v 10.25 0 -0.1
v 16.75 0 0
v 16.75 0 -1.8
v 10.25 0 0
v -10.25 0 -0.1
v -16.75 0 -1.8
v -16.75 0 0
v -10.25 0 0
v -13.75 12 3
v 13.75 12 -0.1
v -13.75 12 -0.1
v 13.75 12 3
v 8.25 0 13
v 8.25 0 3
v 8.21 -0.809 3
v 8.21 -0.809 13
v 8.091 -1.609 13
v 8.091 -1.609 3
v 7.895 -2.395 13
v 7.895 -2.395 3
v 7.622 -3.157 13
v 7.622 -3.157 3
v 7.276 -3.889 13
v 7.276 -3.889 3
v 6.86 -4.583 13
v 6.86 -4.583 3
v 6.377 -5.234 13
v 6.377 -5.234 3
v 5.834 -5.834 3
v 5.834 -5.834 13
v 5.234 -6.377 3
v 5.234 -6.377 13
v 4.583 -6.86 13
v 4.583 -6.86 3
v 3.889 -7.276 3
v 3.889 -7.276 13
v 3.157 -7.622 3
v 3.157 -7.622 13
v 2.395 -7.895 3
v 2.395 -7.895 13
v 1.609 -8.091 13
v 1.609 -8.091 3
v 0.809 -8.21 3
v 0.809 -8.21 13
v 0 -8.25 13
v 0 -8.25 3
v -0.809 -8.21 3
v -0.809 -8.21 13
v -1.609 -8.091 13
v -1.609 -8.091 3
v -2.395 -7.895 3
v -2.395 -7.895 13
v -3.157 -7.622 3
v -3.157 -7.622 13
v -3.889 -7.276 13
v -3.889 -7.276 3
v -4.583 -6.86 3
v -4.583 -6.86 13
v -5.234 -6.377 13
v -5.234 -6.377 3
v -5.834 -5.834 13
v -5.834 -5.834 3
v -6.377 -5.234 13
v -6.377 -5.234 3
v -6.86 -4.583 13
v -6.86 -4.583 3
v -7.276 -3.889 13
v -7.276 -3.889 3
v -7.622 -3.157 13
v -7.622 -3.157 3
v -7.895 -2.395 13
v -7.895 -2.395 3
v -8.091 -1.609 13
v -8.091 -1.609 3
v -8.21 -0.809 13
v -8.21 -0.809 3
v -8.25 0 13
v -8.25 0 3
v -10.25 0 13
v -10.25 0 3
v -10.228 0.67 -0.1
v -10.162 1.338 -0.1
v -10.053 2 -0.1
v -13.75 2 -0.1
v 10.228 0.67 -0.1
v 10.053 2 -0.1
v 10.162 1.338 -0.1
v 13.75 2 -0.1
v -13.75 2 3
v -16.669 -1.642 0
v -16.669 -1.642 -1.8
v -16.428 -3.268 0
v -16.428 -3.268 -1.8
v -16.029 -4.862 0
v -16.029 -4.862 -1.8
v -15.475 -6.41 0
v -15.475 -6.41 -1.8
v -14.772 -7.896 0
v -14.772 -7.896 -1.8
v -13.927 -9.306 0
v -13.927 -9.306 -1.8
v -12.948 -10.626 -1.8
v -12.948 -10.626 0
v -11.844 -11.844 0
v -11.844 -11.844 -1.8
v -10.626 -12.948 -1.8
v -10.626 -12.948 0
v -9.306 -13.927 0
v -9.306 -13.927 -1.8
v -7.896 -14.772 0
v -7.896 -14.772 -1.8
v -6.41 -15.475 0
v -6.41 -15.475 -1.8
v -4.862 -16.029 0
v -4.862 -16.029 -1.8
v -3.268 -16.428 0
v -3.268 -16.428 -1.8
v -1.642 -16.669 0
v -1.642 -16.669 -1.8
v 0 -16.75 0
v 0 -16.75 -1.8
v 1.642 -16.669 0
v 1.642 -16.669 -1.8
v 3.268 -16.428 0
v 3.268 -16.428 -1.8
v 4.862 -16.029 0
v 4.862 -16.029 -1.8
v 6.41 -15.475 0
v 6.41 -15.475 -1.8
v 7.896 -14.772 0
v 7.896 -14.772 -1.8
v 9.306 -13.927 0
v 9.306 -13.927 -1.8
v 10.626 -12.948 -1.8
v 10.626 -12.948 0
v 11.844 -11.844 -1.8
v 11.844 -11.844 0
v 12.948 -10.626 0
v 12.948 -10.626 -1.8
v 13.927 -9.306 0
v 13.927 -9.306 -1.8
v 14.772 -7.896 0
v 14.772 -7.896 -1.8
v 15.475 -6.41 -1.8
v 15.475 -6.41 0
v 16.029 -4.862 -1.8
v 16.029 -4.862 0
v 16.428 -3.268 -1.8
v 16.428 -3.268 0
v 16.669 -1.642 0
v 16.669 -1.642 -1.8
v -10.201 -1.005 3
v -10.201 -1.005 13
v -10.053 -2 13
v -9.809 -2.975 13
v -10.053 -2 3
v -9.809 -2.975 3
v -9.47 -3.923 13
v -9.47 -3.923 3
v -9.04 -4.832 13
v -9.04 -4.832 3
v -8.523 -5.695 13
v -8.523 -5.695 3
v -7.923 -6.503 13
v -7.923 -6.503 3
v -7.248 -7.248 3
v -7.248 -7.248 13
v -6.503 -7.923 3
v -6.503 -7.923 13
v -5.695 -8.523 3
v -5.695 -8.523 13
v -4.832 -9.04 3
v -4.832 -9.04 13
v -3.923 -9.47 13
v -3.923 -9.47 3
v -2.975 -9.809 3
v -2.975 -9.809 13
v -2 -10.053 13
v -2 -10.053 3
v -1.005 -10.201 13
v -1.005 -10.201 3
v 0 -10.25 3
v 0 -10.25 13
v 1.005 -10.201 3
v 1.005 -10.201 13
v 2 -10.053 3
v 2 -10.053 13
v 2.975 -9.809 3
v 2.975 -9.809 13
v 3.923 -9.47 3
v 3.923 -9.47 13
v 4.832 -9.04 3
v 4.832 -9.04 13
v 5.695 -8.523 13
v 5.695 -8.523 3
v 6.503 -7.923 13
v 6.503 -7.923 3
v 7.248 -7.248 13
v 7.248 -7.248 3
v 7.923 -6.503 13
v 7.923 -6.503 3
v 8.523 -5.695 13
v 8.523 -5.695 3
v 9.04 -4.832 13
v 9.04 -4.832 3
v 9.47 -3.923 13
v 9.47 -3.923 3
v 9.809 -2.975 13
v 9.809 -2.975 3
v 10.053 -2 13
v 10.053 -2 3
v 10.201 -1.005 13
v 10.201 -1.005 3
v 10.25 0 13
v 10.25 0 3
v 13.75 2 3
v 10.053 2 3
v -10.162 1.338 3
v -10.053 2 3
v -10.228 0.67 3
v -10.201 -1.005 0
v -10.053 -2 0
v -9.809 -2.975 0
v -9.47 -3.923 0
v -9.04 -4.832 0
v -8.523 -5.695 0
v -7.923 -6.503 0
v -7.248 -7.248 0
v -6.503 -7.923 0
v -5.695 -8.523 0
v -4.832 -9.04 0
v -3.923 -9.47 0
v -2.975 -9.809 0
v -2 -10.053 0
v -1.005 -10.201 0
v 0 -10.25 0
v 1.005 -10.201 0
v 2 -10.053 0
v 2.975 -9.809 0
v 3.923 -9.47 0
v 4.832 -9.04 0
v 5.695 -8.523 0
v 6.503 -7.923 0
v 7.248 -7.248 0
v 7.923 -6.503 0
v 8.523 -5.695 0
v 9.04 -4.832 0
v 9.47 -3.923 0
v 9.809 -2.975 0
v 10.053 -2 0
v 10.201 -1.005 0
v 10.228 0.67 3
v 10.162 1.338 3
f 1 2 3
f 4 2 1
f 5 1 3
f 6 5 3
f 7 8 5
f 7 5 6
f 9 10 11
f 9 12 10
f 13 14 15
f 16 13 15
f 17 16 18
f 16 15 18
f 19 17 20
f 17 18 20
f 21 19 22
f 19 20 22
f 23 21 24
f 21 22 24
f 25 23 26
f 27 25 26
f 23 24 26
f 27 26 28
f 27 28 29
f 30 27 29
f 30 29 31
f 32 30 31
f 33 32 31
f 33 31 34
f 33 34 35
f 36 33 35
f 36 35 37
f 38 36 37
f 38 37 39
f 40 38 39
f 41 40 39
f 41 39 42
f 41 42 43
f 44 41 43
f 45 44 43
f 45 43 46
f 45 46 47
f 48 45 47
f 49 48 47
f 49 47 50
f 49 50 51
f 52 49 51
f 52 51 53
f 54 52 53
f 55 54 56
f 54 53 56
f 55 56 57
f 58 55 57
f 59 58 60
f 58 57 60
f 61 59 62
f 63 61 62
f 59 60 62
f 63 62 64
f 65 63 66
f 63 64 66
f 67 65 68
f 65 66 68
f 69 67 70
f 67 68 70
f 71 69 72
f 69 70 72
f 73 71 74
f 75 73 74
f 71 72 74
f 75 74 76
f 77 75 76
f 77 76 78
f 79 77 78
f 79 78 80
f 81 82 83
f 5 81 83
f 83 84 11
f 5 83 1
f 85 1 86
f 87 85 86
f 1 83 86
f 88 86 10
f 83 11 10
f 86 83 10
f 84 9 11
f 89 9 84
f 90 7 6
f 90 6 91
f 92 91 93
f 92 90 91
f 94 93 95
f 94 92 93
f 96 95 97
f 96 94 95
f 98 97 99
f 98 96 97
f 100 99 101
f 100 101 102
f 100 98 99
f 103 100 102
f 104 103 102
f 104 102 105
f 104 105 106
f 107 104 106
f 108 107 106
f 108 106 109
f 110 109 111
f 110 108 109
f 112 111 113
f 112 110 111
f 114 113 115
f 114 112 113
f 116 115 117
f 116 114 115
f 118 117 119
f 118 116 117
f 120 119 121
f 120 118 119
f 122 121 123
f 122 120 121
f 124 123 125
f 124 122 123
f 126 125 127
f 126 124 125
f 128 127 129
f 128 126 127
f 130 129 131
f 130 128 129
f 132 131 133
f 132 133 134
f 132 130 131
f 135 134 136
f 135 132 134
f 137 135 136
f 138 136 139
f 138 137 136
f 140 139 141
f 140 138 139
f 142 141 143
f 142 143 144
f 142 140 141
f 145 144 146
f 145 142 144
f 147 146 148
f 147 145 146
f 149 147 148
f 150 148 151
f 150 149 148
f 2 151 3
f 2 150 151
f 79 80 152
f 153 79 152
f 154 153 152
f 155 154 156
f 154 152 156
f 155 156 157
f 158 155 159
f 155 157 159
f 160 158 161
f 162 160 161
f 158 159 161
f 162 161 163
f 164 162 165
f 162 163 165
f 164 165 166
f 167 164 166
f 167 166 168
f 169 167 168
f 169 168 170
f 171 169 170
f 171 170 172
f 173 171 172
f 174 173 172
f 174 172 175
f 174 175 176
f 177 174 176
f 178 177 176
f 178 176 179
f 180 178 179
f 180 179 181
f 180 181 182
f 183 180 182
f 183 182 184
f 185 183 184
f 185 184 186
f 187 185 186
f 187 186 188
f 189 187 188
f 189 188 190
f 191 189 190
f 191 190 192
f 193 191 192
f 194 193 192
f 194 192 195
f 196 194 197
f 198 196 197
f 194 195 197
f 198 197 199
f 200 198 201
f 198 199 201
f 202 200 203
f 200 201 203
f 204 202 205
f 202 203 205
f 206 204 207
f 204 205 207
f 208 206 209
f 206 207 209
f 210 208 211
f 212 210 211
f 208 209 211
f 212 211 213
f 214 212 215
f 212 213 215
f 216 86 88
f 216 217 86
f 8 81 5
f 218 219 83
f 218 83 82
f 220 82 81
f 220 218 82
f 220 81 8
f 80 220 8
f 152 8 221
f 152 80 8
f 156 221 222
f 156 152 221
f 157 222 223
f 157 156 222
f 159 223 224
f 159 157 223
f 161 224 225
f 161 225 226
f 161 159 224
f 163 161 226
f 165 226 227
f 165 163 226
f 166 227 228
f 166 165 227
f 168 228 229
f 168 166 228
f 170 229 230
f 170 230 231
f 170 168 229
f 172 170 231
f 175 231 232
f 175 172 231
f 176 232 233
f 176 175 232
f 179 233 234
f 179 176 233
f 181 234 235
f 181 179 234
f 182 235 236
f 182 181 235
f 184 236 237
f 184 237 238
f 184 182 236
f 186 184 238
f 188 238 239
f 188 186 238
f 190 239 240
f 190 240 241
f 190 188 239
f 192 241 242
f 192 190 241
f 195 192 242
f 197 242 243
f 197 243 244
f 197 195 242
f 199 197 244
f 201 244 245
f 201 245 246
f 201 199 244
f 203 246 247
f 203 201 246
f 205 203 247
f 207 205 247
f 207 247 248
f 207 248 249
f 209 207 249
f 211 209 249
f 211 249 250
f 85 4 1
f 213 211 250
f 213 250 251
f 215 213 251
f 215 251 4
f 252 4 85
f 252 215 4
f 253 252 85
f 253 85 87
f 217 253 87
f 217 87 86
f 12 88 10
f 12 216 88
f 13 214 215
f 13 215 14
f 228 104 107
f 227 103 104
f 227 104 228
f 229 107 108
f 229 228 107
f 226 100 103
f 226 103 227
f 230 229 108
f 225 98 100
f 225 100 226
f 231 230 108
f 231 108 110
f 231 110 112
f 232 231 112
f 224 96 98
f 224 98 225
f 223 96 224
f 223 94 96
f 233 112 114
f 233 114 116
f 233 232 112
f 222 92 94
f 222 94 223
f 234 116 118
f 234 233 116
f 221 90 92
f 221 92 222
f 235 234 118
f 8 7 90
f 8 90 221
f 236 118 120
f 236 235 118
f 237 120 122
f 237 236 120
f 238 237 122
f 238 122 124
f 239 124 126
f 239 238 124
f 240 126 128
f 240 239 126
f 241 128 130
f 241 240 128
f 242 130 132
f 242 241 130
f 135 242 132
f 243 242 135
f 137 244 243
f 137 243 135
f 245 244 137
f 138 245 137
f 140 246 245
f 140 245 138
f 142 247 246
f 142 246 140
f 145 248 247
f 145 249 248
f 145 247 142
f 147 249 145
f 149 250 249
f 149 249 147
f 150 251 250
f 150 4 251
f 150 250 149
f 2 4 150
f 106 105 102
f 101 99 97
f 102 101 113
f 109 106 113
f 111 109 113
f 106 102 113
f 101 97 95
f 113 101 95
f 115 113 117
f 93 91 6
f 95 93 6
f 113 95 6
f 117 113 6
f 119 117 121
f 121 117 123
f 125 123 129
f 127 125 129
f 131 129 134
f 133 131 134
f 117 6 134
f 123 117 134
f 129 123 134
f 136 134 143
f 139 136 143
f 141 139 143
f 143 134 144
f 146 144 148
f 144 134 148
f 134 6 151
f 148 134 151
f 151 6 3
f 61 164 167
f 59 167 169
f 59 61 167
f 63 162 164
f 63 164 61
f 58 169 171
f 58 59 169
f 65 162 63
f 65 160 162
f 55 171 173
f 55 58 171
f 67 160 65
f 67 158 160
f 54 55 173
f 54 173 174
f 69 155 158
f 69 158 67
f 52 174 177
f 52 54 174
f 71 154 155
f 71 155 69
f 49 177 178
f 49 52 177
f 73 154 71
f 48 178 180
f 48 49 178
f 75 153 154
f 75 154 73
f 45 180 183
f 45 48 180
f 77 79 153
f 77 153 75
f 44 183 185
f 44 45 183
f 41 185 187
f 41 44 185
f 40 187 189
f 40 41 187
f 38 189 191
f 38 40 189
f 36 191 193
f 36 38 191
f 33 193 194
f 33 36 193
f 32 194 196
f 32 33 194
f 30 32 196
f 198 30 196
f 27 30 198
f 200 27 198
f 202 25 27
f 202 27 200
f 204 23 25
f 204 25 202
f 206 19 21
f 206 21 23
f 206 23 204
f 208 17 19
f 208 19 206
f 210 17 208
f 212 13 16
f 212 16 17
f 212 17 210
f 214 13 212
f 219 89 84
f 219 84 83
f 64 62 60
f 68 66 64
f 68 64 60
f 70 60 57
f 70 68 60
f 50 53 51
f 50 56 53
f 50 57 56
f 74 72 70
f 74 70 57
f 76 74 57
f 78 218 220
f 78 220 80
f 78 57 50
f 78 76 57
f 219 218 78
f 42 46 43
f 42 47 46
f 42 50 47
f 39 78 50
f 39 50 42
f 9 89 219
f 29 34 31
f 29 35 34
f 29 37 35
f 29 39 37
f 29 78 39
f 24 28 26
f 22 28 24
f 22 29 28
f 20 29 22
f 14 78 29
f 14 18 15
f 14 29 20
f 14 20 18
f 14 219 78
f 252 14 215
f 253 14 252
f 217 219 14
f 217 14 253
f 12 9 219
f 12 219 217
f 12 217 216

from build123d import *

# Parameters (mm, degrees)
F1_DEPTH      = 1.8
F2_DEPTH      = 3
F2_DEPTH_BACK = 0.1
F3_DEPTH      = 13
F3_DEPTH_BACK = 1.7


with BuildPart() as f1:
    # F0 (on Top) → F1 (new body)
    with BuildSketch(Plane.XY):
        with BuildLine():
            Line((-13.75, 0), (-16.75, 0))
            ThreePointArc((-16.75, 0), (0, -16.75), (16.75, 0))
            Line((16.75, 0), (13.75, 0))
            Line((13.75, 0), (10.25, 0))
            ThreePointArc((10.25, 0), (0, -10.25), (-10.25, 0))
            Line((-10.25, 0), (-13.75, 0))
        make_face()
        with BuildLine():
            Line((-8.25, 0), (-10.25, 0))
            ThreePointArc((-10.25, 0), (0, -10.25), (10.25, 0))
            Line((10.25, 0), (8.25, 0))
            ThreePointArc((8.25, 0), (0, -8.25), (-8.25, 0))
        make_face()
        with BuildLine():
            Line((8.25, 0), (-8.25, 0))
            ThreePointArc((-8.25, 0), (0, -8.25), (8.25, 0))
        make_face()
    extrude(amount=-F1_DEPTH)

    # F0 (on Top) → F2 (join, two sides)
    with BuildSketch(Plane.XY) as f2_sk:
        with BuildLine():
            ThreePointArc((11.6859958925, 12), (12.7761141335, 10.8320546365), (13.75, 9.5655632349))
            Line((13.75, 9.5655632349), (13.75, 12))
            Line((13.75, 12), (11.6859958925, 12))
        make_face()
        with BuildLine():
            ThreePointArc((-10.0529846314, 2), (-10.2006272472, 1.0048401683), (-10.25, 0))
            Line((-10.25, 0), (-8.25, 0))
            ThreePointArc((-8.25, 0), (-8.1882451935, 1.0075418854), (-8.0039052968, 2))
            Line((-8.0039052968, 2), (-10.0529846314, 2))
        make_face()
        with BuildLine():
            ThreePointArc((-8.0039052968, 2), (-8.1882451935, 1.0075418854), (-8.25, 0))
            Line((-8.25, 0), (8.25, 0))
            ThreePointArc((8.25, 0), (8.1882451935, 1.0075418854), (8.0039052968, 2))
            Line((8.0039052968, 2), (-8.0039052968, 2))
        make_face()
        with BuildLine():
            Line((8.25, 0), (10.25, 0))
            ThreePointArc((10.25, 0), (10.2006272472, 1.0048401683), (10.0529846314, 2))
            Line((10.0529846314, 2), (8.0039052968, 2))
            ThreePointArc((8.0039052968, 2), (8.1882451935, 1.0075418854), (8.25, 0))
        make_face()
        with BuildLine():
            ThreePointArc((-11.6859958925, 12), (-12.7761141335, 10.8320546365), (-13.75, 9.5655632349))
            Line((-13.75, 9.5655632349), (-13.75, 2))
            Line((-13.75, 2), (-10.0529846314, 2))
            ThreePointArc((-10.0529846314, 2), (0, 10.25), (10.0529846314, 2))
            Line((10.0529846314, 2), (13.75, 2))
            Line((13.75, 2), (13.75, 9.5655632349))
            ThreePointArc((13.75, 9.5655632349), (12.7761141335, 10.8320546365), (11.6859958925, 12))
            Line((11.6859958925, 12), (-11.6859958925, 12))
        make_face()
        with BuildLine():
            Line((8.25, 0), (-8.25, 0))
            ThreePointArc((-8.25, 0), (0, -8.25), (8.25, 0))
        make_face()
        with BuildLine():
            Line((-8.25, 0), (-10.25, 0))
            ThreePointArc((-10.25, 0), (0, -10.25), (10.25, 0))
            Line((10.25, 0), (8.25, 0))
            ThreePointArc((8.25, 0), (0, -8.25), (-8.25, 0))
        make_face()
        with BuildLine():
            ThreePointArc((10.0529846314, 2), (0, 10.25), (-10.0529846314, 2))
            Line((-10.0529846314, 2), (-8.0039052968, 2))
            ThreePointArc((-8.0039052968, 2), (0, 8.25), (8.0039052968, 2))
            Line((8.0039052968, 2), (10.0529846314, 2))
        make_face()
        with BuildLine():
            ThreePointArc((8.0039052968, 2), (0, 8.25), (-8.0039052968, 2))
            Line((-8.0039052968, 2), (8.0039052968, 2))
        make_face()
        with BuildLine():
            Line((-13.75, 12), (-13.75, 9.5655632349))
            ThreePointArc((-13.75, 9.5655632349), (-12.7761141335, 10.8320546365), (-11.6859958925, 12))
            Line((-11.6859958925, 12), (-13.75, 12))
        make_face()
    extrude(amount=F2_DEPTH)
    extrude(f2_sk.sketch, amount=-F2_DEPTH_BACK)

    # F0 (on Top) → F3 (join, two sides)
    with BuildSketch(Plane.XY) as f3_sk:
        with BuildLine():
            Line((-8.25, 0), (-10.25, 0))
            ThreePointArc((-10.25, 0), (0, -10.25), (10.25, 0))
            Line((10.25, 0), (8.25, 0))
            ThreePointArc((8.25, 0), (0, -8.25), (-8.25, 0))
        make_face()
    extrude(amount=F3_DEPTH)
    extrude(f3_sk.sketch, amount=-F3_DEPTH_BACK)


solid = f1.part
